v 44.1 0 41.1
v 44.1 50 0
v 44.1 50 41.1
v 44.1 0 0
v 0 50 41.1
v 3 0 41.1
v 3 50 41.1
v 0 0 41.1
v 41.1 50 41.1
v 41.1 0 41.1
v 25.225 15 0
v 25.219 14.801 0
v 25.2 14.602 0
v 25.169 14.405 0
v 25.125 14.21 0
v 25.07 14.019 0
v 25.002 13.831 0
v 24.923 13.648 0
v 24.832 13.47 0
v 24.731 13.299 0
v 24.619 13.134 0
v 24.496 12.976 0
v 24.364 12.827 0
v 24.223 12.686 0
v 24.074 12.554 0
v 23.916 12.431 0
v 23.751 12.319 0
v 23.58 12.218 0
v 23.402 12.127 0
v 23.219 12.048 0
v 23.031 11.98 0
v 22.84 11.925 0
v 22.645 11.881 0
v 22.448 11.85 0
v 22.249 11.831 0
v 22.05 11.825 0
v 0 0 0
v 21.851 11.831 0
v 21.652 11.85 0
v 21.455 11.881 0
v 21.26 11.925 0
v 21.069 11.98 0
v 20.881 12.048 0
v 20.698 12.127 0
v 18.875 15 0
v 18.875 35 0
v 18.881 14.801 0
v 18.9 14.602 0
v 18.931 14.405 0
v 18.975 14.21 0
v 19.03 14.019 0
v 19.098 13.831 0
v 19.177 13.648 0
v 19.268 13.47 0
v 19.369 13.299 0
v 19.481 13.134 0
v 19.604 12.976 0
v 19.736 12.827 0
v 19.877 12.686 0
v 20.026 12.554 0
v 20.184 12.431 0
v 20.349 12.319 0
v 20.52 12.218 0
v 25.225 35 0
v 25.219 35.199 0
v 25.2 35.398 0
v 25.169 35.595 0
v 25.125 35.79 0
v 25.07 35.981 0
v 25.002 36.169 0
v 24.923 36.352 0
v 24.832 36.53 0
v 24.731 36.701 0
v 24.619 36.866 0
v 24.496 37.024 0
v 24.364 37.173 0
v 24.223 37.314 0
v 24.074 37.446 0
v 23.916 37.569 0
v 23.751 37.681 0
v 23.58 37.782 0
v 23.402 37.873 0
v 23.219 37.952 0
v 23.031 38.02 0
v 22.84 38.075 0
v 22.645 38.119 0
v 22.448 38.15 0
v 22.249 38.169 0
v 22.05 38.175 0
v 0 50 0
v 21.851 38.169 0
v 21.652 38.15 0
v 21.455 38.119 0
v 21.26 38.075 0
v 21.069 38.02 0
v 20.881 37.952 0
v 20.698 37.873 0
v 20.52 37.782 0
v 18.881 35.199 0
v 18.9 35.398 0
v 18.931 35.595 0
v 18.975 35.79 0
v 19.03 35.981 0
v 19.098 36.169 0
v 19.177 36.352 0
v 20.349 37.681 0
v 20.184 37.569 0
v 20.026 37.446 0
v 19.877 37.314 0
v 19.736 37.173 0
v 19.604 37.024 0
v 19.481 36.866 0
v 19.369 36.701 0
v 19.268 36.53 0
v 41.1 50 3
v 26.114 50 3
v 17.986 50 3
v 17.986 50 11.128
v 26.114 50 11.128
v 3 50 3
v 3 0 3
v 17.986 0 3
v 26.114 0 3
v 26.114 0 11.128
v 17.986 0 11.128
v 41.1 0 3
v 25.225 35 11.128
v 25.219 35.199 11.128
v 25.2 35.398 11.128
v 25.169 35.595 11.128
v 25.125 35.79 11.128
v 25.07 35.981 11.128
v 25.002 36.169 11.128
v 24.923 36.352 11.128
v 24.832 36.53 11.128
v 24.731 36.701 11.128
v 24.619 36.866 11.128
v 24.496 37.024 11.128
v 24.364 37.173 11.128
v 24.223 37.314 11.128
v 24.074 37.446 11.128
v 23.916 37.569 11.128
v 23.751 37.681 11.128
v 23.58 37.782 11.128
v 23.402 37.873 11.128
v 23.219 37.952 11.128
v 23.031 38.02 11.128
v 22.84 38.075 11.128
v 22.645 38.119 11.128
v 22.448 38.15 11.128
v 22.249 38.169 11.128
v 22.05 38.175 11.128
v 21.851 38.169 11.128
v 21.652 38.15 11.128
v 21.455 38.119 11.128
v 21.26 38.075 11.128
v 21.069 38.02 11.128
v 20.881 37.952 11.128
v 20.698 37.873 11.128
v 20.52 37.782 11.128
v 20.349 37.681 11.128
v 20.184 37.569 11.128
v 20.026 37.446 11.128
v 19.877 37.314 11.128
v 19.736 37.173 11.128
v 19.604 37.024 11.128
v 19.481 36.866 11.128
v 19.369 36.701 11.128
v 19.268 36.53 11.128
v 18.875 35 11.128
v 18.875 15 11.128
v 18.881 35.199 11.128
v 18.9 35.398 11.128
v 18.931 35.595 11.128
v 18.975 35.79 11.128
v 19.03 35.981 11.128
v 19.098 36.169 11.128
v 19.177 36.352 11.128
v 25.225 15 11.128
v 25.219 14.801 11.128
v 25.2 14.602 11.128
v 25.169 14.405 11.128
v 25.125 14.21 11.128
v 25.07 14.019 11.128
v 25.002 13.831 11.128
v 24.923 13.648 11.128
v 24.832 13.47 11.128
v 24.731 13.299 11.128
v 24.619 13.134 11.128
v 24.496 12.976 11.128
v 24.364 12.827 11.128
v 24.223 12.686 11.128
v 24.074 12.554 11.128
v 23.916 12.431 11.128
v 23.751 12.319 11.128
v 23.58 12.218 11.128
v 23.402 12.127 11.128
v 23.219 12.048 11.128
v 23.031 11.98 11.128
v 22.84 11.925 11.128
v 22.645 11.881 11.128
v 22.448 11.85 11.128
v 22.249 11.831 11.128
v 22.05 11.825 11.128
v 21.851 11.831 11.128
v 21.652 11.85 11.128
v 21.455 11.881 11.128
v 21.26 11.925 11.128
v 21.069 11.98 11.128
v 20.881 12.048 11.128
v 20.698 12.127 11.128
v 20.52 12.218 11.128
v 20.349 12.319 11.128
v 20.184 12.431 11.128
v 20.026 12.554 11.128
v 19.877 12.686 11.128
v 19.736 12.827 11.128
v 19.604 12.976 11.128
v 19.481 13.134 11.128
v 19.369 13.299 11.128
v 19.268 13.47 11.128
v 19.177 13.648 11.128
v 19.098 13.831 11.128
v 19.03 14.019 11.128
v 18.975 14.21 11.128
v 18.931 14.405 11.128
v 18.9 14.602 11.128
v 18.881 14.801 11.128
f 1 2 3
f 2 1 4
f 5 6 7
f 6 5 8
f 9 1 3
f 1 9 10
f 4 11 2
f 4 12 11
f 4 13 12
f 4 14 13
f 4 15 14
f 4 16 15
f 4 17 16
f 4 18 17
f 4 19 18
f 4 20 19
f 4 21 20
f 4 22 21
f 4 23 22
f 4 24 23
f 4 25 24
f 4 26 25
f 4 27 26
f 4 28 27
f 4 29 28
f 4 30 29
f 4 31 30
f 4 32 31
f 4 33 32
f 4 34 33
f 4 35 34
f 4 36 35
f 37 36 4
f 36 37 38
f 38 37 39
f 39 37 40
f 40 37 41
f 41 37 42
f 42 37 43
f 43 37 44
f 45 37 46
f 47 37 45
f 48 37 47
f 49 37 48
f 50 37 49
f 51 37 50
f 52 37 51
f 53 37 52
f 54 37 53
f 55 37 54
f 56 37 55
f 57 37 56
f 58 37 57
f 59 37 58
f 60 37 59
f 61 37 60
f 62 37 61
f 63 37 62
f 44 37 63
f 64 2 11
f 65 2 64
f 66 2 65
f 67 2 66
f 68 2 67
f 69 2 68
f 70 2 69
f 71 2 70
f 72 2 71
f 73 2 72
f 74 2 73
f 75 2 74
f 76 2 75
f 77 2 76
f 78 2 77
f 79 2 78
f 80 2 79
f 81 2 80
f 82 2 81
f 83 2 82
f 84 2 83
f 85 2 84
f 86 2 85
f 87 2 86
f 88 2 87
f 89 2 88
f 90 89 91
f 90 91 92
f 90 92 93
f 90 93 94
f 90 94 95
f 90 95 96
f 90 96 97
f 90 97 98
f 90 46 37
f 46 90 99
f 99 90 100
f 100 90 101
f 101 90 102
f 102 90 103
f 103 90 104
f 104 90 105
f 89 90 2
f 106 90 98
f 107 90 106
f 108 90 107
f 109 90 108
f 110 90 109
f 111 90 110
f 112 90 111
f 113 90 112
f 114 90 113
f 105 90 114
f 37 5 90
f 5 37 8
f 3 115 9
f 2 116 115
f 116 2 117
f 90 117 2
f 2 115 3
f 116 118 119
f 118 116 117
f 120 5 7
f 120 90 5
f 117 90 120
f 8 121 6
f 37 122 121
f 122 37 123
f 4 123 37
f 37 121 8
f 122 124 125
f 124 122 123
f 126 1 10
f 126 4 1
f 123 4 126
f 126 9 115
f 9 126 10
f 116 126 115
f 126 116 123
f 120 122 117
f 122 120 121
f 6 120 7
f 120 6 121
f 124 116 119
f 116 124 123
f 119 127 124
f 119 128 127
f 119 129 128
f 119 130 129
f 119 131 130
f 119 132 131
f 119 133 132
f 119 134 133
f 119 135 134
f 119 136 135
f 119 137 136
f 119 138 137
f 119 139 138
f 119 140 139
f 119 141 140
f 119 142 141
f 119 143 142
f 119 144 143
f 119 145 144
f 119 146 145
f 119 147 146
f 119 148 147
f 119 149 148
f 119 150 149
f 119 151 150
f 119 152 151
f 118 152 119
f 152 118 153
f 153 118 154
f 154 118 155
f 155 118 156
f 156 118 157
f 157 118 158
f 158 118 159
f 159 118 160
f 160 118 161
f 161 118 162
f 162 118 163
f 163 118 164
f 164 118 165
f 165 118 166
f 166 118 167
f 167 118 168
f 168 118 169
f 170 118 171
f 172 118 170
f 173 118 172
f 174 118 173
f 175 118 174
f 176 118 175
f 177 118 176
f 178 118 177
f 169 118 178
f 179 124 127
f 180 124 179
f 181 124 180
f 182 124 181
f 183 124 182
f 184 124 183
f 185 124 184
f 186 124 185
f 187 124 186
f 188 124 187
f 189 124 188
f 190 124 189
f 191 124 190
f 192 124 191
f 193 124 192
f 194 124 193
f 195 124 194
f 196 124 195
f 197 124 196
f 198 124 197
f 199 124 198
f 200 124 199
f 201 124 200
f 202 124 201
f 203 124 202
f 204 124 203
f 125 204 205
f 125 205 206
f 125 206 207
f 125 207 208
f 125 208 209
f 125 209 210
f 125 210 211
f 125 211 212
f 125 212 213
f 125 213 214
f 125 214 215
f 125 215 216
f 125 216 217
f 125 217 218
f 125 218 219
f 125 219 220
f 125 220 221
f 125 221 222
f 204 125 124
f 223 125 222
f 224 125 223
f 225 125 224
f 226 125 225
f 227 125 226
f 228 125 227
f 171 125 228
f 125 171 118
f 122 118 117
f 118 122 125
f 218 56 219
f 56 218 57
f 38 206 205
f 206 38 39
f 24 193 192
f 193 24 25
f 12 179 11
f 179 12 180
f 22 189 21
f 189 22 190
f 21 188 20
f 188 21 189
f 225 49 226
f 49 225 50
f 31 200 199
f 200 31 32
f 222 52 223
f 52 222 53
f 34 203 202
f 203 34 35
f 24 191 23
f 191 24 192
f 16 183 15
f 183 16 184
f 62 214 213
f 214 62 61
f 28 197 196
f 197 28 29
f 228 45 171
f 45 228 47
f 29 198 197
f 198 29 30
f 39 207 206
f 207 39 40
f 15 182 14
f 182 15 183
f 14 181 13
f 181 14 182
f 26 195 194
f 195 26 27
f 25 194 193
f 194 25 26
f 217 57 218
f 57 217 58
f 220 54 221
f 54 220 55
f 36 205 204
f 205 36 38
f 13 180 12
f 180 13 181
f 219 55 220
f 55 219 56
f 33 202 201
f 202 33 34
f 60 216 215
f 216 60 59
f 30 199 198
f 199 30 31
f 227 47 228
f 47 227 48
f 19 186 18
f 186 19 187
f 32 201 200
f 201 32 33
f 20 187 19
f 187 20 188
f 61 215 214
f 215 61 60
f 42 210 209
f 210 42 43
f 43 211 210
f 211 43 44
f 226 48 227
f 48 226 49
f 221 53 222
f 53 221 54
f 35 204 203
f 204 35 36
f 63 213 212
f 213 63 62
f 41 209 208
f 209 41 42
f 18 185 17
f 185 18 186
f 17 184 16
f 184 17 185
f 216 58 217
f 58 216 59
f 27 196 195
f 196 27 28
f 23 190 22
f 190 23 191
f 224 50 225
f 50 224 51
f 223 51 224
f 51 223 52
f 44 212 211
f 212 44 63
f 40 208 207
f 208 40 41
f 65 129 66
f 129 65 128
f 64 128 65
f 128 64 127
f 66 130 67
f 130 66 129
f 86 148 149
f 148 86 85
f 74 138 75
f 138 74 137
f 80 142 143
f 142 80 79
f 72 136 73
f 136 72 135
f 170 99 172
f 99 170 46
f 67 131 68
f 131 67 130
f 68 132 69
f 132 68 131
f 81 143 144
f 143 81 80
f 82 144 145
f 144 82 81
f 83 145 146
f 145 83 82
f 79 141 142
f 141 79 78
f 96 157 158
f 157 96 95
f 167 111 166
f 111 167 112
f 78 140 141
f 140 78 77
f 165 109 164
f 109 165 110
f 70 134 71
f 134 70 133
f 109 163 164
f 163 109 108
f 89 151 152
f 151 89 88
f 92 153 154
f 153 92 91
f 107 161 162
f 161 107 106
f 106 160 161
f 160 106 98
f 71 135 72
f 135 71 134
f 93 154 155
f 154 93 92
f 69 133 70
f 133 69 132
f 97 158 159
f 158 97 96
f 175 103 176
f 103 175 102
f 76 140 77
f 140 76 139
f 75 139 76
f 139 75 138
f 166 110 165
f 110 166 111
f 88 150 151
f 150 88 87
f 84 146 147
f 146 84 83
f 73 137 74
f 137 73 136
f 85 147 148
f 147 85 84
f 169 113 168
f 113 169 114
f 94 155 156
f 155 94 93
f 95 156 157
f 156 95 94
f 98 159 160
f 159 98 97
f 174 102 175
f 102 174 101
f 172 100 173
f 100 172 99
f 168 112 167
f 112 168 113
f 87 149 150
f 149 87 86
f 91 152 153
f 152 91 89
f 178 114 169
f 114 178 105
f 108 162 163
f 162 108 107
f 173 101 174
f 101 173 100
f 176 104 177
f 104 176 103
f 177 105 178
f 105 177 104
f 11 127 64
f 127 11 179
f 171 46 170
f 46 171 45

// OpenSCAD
$fn = 100;
padding = 3;
xz = 38.1;
y = 50;
channel_xz = 8.128;
drill_dia = 6.35;
difference() {
  union() {
    //main hollow box
    difference() {
      cube([xz+padding*2, y, xz+padding]);
      translate([padding, -1, padding]) {
        cube([xz, y+2, xz+1]);
      }
    }
    //slot
    translate([(xz+padding*2)/2 - channel_xz/2, 0, padding]) {
      cube([channel_xz, y, channel_xz]);
    }
  }
  //channel
  translate([(xz+padding*2)/2, y/2-10, -1]) {
    cylinder(d=drill_dia, h=xz+padding*2);
  }
  translate([(xz+padding*2)/2, y/2+10, -1]) {
    cylinder(d=drill_dia, h=xz+padding*2);
  }
  translate([(xz+padding*2)/2, y/2, -1]) {
    cube([drill_dia, 20, xz+padding], center=true);
  }
}
